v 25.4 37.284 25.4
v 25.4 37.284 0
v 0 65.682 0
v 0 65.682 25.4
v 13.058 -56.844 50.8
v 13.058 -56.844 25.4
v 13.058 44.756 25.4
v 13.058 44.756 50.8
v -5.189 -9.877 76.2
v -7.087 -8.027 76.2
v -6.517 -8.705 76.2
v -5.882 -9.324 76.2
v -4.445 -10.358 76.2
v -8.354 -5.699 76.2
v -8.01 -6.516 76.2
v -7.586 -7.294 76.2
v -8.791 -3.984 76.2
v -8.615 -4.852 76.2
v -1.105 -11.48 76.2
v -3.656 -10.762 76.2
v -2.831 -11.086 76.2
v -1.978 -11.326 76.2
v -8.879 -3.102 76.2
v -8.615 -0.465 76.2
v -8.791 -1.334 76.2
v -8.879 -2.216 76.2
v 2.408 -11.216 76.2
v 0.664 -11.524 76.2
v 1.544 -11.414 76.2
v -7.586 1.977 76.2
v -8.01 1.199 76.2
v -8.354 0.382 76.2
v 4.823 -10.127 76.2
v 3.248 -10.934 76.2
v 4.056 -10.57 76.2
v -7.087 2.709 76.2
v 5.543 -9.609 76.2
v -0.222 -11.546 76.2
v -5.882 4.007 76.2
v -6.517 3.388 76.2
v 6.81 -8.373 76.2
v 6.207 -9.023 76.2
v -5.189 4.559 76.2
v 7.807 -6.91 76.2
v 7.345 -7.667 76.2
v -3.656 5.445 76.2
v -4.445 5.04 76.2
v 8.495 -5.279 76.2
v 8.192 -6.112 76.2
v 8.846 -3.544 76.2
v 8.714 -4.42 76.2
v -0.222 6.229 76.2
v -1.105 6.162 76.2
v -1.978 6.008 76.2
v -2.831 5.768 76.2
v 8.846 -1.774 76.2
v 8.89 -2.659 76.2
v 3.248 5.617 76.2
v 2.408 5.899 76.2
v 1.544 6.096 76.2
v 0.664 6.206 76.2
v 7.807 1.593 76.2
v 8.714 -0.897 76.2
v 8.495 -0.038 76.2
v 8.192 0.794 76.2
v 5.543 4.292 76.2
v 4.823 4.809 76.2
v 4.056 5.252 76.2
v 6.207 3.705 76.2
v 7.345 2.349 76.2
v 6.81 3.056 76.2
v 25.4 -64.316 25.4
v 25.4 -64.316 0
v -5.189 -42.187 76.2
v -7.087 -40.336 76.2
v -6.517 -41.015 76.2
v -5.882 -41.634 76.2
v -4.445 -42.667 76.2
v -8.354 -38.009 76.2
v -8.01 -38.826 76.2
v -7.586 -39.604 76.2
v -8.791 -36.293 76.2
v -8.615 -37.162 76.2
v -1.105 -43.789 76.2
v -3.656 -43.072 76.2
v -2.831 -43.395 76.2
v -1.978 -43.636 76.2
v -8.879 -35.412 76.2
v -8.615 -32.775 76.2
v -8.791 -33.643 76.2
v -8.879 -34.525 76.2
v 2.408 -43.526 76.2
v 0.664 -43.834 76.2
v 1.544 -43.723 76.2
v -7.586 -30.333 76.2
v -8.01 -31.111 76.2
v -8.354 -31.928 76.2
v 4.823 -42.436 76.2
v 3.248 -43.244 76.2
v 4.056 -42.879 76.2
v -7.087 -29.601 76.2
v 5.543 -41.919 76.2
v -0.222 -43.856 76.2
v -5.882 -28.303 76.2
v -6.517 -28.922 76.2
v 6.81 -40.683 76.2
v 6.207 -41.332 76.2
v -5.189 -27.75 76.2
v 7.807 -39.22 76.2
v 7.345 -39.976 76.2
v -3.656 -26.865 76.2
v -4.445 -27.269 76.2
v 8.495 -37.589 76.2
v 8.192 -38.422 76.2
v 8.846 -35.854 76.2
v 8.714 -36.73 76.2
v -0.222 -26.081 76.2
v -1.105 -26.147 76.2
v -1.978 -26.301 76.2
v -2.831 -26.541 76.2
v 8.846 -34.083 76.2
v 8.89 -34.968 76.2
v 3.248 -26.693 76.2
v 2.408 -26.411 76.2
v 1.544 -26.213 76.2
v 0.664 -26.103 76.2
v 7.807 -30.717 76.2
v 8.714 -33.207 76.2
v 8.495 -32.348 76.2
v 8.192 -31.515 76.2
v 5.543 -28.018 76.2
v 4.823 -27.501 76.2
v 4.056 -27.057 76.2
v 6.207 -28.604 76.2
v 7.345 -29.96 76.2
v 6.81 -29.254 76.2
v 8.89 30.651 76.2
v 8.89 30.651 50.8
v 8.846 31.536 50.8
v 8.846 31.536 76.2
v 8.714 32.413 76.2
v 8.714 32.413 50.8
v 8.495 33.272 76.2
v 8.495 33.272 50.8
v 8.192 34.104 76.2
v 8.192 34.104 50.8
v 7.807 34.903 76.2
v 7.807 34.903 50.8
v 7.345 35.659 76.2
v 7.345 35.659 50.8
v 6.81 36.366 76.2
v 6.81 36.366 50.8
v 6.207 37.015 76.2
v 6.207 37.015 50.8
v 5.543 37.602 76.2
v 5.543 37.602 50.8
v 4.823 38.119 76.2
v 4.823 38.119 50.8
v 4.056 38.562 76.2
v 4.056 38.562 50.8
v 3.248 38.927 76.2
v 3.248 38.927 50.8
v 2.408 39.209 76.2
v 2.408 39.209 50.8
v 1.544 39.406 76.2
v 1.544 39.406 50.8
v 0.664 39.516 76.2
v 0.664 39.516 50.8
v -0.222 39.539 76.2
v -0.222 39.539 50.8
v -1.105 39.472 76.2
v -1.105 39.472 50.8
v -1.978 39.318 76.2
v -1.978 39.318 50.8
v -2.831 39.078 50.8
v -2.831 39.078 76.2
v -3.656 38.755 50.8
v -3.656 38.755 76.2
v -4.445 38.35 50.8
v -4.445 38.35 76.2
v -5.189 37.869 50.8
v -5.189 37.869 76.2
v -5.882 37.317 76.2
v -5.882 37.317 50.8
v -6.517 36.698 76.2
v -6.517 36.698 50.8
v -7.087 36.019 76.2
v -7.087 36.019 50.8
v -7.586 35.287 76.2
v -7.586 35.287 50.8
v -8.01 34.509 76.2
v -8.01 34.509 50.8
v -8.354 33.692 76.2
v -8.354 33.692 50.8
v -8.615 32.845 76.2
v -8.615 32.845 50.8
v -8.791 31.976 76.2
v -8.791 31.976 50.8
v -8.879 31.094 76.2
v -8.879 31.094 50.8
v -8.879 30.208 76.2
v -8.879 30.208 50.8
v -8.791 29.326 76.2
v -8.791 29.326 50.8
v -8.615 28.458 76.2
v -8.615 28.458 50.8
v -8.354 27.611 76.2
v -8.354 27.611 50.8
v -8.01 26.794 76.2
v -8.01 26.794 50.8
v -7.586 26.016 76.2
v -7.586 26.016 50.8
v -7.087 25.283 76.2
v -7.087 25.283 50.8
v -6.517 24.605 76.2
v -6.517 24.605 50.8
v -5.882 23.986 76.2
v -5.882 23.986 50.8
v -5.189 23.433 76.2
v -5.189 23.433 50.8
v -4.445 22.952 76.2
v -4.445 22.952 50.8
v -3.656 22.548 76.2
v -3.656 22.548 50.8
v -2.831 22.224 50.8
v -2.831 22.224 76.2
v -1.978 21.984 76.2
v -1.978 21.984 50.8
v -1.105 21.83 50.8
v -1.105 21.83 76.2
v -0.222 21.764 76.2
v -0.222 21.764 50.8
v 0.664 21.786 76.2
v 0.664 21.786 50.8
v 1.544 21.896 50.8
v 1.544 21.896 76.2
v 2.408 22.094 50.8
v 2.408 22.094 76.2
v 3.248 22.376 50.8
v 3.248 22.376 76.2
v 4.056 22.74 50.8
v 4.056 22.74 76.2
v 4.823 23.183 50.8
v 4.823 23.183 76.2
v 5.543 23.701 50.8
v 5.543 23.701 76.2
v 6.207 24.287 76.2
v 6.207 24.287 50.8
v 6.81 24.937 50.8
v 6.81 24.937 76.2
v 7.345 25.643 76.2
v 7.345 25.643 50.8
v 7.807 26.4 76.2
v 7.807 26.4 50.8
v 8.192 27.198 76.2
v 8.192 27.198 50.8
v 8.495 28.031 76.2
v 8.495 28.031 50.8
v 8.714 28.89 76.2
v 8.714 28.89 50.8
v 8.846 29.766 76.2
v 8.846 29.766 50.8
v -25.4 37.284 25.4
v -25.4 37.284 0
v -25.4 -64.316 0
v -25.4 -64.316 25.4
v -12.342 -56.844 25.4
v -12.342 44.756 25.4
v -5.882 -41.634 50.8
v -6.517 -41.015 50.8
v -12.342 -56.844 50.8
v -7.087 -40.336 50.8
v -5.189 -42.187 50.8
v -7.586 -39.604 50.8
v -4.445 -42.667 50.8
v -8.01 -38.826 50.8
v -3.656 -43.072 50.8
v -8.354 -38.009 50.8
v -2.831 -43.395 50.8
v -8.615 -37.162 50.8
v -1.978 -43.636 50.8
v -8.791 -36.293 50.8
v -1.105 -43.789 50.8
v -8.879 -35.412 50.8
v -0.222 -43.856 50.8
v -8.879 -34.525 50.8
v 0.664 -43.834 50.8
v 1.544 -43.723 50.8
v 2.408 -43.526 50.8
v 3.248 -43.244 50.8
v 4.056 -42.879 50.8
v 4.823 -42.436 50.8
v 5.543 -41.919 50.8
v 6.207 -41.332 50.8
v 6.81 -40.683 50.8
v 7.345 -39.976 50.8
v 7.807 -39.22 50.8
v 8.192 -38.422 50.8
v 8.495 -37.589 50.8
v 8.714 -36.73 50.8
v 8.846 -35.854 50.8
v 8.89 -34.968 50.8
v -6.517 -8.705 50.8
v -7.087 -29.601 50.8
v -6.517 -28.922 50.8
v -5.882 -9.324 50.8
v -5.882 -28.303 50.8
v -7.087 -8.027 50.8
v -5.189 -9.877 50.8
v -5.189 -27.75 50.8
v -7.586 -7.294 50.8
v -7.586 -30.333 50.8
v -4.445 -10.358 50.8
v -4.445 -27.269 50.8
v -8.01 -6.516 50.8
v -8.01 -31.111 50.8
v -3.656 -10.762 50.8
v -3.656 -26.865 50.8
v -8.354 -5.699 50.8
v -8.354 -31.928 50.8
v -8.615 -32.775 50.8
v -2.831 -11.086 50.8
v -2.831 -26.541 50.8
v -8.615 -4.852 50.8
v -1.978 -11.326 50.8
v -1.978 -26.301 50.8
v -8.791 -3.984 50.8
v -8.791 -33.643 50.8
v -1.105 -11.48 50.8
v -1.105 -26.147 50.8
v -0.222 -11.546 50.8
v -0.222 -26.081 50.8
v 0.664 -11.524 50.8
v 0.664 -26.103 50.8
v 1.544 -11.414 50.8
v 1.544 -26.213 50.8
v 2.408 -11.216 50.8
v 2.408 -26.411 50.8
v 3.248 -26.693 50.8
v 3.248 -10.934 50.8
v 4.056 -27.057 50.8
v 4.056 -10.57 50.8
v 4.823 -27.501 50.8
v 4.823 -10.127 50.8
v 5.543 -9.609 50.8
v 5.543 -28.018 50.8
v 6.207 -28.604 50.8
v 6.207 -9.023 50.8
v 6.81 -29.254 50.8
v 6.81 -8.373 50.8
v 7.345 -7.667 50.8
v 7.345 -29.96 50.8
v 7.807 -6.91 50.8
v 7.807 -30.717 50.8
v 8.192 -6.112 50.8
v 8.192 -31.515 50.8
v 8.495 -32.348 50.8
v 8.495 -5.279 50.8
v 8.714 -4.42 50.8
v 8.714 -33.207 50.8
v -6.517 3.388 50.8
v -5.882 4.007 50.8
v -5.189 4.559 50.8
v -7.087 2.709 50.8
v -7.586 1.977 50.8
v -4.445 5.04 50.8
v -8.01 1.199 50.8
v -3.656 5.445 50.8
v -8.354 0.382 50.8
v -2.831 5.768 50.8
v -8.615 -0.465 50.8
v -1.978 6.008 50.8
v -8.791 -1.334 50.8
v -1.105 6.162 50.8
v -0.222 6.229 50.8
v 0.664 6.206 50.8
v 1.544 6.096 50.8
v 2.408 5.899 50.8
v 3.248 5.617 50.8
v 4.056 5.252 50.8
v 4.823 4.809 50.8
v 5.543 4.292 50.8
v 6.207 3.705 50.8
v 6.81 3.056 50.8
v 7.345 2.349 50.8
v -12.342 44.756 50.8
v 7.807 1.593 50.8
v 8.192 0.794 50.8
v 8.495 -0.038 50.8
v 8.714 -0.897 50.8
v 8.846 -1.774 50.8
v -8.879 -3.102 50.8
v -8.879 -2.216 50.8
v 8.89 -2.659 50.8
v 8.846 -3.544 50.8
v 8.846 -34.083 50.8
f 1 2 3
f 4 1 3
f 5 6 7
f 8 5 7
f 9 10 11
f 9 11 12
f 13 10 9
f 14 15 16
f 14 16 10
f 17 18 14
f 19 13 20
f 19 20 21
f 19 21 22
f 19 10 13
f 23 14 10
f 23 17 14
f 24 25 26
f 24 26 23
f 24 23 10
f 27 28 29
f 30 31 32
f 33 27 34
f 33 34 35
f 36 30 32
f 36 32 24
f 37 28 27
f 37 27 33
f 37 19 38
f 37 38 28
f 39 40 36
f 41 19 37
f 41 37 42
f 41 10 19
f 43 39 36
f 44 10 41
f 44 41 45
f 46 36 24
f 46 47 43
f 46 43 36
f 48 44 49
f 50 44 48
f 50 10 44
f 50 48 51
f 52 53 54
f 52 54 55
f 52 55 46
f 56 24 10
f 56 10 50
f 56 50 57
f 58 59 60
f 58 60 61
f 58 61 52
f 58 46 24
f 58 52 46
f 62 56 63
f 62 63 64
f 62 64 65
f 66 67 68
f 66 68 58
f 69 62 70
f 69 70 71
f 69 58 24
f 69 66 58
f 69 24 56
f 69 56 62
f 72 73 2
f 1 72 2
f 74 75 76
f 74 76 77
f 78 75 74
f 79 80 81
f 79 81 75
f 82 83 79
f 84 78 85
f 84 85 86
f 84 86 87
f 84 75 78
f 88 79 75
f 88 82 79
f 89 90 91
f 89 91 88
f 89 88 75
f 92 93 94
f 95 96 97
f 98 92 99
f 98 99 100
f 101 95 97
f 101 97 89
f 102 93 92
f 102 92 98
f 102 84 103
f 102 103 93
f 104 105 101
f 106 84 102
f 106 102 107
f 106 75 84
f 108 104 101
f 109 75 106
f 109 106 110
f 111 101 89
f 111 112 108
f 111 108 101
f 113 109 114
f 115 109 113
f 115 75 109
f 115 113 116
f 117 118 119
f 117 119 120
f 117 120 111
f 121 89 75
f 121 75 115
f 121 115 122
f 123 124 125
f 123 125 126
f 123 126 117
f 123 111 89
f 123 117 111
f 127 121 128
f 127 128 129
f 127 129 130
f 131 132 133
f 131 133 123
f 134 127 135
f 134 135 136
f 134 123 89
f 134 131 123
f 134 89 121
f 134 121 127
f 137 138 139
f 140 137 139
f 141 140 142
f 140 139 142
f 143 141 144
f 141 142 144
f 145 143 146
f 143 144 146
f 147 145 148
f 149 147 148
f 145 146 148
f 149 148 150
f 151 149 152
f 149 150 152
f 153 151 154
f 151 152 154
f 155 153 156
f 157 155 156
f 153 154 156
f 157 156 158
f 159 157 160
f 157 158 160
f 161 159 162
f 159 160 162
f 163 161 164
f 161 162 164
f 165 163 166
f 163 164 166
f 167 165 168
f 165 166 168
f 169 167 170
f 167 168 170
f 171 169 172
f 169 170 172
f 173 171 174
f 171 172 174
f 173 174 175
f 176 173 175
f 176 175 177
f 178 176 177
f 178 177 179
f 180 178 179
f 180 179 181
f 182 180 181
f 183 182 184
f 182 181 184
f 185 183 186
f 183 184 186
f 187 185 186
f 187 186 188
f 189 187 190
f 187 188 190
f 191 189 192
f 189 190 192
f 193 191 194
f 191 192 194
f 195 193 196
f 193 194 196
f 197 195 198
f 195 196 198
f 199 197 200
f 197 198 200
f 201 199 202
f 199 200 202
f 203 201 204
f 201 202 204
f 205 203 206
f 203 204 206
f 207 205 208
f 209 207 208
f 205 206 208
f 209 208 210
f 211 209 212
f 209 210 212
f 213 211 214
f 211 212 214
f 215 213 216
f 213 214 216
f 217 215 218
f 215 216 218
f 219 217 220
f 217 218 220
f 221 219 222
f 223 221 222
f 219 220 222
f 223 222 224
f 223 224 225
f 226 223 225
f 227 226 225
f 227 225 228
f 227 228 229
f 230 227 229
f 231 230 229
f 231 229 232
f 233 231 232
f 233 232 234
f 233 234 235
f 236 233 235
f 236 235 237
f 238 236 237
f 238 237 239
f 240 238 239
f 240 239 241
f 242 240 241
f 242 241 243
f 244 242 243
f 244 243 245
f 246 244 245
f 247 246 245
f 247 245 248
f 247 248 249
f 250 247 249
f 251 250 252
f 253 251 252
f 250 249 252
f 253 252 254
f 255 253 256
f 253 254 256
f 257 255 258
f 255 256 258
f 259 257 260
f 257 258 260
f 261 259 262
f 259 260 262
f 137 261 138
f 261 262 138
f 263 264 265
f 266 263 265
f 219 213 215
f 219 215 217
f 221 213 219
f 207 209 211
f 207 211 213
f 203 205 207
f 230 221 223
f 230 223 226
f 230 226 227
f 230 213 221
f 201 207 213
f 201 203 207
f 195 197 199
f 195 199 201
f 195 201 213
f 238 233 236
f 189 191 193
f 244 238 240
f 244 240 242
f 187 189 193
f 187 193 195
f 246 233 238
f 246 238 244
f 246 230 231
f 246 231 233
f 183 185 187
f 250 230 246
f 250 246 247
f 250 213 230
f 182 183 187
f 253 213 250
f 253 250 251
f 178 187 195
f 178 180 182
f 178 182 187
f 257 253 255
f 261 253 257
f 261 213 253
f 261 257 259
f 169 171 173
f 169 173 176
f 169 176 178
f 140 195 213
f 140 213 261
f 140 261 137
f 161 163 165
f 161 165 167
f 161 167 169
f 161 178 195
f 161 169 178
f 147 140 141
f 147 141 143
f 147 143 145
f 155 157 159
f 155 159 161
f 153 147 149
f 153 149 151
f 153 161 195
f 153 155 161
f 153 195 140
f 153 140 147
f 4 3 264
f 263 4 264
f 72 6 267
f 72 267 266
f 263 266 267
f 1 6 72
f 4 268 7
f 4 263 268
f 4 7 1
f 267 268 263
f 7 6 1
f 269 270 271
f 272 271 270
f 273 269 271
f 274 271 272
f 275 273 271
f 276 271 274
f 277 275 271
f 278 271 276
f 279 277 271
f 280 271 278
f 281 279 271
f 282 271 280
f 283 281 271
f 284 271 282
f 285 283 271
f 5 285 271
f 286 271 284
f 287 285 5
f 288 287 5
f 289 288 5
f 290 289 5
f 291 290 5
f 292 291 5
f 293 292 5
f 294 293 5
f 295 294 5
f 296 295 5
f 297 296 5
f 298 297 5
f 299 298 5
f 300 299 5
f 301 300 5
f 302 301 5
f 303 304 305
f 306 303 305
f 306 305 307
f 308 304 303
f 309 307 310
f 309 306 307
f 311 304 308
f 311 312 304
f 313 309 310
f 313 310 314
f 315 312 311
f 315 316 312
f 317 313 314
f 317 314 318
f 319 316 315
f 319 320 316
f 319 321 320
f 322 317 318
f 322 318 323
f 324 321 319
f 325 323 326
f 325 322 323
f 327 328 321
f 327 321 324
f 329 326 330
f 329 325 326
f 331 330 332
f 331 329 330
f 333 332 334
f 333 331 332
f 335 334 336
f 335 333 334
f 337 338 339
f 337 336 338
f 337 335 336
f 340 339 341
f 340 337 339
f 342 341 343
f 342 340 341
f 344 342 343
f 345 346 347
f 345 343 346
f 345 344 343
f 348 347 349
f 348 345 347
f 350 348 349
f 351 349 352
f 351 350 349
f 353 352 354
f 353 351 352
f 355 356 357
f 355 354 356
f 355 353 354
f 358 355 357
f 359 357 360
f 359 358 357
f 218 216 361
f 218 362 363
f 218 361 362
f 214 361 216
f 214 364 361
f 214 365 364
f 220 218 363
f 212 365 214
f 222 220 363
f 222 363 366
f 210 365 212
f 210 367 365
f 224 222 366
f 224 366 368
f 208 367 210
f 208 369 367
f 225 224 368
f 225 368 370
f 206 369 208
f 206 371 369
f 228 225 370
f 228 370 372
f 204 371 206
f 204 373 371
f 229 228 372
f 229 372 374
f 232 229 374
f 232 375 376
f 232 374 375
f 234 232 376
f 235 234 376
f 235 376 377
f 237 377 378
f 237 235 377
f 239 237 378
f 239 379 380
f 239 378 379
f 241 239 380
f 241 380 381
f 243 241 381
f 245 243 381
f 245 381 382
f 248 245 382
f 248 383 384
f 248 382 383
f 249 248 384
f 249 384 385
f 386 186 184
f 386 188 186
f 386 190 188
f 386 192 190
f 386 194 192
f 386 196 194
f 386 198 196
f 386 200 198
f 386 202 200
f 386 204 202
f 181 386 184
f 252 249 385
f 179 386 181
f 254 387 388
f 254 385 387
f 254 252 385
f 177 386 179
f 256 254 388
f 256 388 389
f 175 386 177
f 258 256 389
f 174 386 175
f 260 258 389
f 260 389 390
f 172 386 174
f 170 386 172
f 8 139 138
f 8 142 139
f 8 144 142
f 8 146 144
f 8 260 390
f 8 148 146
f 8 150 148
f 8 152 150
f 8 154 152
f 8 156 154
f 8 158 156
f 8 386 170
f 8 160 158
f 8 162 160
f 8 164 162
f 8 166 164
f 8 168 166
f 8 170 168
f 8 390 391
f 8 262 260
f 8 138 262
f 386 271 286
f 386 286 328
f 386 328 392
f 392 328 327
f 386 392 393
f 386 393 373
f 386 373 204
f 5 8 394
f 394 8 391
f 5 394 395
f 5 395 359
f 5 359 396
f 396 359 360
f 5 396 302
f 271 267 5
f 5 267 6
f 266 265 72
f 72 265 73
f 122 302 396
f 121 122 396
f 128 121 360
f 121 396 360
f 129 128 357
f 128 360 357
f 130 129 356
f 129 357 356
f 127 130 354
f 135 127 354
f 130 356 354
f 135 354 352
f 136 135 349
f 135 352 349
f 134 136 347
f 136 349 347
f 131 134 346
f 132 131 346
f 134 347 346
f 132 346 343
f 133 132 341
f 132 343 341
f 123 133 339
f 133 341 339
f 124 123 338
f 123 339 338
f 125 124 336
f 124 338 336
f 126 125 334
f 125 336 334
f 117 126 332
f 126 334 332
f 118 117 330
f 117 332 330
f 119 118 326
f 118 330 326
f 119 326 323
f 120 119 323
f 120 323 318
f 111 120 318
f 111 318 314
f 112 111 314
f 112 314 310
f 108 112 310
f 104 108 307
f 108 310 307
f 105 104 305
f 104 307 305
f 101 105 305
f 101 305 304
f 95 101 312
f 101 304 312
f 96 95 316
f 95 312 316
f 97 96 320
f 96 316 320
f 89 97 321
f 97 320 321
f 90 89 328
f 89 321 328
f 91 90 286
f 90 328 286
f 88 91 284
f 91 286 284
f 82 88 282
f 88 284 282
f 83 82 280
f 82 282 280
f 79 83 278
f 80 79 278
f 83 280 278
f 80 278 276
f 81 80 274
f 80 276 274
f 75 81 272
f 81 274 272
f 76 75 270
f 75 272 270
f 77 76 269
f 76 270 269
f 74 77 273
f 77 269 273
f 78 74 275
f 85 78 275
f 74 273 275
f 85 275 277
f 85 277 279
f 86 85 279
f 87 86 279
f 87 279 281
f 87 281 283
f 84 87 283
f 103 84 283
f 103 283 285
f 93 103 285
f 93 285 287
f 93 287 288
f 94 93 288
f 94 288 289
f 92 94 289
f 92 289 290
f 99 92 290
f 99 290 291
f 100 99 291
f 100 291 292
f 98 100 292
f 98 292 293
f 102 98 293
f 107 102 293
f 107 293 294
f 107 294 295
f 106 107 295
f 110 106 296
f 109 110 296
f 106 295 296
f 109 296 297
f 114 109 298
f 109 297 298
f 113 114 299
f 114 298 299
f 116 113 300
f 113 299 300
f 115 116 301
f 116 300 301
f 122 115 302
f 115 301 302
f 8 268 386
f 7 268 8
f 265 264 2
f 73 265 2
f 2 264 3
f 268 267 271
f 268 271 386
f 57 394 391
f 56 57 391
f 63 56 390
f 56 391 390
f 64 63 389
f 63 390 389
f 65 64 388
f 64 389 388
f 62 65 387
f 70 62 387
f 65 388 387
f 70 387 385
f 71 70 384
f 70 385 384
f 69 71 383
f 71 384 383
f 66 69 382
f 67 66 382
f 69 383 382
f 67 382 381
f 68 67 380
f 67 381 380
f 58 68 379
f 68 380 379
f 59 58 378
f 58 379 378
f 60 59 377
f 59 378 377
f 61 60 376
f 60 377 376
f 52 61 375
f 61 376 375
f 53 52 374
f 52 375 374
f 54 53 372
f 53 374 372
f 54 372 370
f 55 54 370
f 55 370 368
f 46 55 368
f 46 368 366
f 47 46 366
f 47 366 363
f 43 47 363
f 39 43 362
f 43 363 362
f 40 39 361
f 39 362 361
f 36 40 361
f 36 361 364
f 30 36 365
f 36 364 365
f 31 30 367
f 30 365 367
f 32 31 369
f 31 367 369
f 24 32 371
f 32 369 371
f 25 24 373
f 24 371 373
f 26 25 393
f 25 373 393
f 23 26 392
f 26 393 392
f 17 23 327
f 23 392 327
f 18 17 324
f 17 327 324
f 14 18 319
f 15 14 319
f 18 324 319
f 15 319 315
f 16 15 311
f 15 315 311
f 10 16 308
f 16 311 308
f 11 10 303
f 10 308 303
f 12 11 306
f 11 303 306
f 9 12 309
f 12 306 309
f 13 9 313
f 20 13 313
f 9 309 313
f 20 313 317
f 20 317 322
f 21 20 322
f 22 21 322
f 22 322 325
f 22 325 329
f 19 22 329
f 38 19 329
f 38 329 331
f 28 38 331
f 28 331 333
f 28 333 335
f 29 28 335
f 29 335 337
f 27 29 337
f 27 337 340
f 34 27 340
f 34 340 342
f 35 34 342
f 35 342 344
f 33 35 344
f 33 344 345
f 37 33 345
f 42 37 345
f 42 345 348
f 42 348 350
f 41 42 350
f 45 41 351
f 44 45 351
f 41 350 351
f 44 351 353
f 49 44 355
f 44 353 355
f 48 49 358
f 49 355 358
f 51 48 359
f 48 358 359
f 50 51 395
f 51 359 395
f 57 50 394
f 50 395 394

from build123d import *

# Parameters (mm, degrees)
F1_DEPTH = 25.4
F2_W     = 25.4
F2_H     = 101.6
F3_DEPTH = 25.4
F4_R     = 8.89
F5_DEPTH = 25.4


with BuildPart() as f1:
    # F0 (on Top) → F1 (new body)
    with BuildSketch(Plane.XY):
        Polygon((25.4, -64.316225), (25.4, 37.283775), (0, 65.681839), (-25.4, 37.283775), (-25.4, -64.316225), align=None)
    extrude(amount=F1_DEPTH)

    # F2 (on face) → F3 (join)
    with BuildSketch(Plane.XY.offset(25.4)):
        with Locations((0.357762, -6.04392)):
            Rectangle(F2_W, F2_H)
    extrude(amount=F3_DEPTH)

    # F4 (on face) → F5 (join)
    with BuildSketch(Plane.XY.offset(50.8)):
        with Locations((0, -34.968402)):
            Circle(F4_R)
        with Locations((0, -2.658716)):
            Circle(F4_R)
        with Locations((0, 30.651314)):
            Circle(F4_R)
    extrude(amount=F5_DEPTH)


solid = f1.part
